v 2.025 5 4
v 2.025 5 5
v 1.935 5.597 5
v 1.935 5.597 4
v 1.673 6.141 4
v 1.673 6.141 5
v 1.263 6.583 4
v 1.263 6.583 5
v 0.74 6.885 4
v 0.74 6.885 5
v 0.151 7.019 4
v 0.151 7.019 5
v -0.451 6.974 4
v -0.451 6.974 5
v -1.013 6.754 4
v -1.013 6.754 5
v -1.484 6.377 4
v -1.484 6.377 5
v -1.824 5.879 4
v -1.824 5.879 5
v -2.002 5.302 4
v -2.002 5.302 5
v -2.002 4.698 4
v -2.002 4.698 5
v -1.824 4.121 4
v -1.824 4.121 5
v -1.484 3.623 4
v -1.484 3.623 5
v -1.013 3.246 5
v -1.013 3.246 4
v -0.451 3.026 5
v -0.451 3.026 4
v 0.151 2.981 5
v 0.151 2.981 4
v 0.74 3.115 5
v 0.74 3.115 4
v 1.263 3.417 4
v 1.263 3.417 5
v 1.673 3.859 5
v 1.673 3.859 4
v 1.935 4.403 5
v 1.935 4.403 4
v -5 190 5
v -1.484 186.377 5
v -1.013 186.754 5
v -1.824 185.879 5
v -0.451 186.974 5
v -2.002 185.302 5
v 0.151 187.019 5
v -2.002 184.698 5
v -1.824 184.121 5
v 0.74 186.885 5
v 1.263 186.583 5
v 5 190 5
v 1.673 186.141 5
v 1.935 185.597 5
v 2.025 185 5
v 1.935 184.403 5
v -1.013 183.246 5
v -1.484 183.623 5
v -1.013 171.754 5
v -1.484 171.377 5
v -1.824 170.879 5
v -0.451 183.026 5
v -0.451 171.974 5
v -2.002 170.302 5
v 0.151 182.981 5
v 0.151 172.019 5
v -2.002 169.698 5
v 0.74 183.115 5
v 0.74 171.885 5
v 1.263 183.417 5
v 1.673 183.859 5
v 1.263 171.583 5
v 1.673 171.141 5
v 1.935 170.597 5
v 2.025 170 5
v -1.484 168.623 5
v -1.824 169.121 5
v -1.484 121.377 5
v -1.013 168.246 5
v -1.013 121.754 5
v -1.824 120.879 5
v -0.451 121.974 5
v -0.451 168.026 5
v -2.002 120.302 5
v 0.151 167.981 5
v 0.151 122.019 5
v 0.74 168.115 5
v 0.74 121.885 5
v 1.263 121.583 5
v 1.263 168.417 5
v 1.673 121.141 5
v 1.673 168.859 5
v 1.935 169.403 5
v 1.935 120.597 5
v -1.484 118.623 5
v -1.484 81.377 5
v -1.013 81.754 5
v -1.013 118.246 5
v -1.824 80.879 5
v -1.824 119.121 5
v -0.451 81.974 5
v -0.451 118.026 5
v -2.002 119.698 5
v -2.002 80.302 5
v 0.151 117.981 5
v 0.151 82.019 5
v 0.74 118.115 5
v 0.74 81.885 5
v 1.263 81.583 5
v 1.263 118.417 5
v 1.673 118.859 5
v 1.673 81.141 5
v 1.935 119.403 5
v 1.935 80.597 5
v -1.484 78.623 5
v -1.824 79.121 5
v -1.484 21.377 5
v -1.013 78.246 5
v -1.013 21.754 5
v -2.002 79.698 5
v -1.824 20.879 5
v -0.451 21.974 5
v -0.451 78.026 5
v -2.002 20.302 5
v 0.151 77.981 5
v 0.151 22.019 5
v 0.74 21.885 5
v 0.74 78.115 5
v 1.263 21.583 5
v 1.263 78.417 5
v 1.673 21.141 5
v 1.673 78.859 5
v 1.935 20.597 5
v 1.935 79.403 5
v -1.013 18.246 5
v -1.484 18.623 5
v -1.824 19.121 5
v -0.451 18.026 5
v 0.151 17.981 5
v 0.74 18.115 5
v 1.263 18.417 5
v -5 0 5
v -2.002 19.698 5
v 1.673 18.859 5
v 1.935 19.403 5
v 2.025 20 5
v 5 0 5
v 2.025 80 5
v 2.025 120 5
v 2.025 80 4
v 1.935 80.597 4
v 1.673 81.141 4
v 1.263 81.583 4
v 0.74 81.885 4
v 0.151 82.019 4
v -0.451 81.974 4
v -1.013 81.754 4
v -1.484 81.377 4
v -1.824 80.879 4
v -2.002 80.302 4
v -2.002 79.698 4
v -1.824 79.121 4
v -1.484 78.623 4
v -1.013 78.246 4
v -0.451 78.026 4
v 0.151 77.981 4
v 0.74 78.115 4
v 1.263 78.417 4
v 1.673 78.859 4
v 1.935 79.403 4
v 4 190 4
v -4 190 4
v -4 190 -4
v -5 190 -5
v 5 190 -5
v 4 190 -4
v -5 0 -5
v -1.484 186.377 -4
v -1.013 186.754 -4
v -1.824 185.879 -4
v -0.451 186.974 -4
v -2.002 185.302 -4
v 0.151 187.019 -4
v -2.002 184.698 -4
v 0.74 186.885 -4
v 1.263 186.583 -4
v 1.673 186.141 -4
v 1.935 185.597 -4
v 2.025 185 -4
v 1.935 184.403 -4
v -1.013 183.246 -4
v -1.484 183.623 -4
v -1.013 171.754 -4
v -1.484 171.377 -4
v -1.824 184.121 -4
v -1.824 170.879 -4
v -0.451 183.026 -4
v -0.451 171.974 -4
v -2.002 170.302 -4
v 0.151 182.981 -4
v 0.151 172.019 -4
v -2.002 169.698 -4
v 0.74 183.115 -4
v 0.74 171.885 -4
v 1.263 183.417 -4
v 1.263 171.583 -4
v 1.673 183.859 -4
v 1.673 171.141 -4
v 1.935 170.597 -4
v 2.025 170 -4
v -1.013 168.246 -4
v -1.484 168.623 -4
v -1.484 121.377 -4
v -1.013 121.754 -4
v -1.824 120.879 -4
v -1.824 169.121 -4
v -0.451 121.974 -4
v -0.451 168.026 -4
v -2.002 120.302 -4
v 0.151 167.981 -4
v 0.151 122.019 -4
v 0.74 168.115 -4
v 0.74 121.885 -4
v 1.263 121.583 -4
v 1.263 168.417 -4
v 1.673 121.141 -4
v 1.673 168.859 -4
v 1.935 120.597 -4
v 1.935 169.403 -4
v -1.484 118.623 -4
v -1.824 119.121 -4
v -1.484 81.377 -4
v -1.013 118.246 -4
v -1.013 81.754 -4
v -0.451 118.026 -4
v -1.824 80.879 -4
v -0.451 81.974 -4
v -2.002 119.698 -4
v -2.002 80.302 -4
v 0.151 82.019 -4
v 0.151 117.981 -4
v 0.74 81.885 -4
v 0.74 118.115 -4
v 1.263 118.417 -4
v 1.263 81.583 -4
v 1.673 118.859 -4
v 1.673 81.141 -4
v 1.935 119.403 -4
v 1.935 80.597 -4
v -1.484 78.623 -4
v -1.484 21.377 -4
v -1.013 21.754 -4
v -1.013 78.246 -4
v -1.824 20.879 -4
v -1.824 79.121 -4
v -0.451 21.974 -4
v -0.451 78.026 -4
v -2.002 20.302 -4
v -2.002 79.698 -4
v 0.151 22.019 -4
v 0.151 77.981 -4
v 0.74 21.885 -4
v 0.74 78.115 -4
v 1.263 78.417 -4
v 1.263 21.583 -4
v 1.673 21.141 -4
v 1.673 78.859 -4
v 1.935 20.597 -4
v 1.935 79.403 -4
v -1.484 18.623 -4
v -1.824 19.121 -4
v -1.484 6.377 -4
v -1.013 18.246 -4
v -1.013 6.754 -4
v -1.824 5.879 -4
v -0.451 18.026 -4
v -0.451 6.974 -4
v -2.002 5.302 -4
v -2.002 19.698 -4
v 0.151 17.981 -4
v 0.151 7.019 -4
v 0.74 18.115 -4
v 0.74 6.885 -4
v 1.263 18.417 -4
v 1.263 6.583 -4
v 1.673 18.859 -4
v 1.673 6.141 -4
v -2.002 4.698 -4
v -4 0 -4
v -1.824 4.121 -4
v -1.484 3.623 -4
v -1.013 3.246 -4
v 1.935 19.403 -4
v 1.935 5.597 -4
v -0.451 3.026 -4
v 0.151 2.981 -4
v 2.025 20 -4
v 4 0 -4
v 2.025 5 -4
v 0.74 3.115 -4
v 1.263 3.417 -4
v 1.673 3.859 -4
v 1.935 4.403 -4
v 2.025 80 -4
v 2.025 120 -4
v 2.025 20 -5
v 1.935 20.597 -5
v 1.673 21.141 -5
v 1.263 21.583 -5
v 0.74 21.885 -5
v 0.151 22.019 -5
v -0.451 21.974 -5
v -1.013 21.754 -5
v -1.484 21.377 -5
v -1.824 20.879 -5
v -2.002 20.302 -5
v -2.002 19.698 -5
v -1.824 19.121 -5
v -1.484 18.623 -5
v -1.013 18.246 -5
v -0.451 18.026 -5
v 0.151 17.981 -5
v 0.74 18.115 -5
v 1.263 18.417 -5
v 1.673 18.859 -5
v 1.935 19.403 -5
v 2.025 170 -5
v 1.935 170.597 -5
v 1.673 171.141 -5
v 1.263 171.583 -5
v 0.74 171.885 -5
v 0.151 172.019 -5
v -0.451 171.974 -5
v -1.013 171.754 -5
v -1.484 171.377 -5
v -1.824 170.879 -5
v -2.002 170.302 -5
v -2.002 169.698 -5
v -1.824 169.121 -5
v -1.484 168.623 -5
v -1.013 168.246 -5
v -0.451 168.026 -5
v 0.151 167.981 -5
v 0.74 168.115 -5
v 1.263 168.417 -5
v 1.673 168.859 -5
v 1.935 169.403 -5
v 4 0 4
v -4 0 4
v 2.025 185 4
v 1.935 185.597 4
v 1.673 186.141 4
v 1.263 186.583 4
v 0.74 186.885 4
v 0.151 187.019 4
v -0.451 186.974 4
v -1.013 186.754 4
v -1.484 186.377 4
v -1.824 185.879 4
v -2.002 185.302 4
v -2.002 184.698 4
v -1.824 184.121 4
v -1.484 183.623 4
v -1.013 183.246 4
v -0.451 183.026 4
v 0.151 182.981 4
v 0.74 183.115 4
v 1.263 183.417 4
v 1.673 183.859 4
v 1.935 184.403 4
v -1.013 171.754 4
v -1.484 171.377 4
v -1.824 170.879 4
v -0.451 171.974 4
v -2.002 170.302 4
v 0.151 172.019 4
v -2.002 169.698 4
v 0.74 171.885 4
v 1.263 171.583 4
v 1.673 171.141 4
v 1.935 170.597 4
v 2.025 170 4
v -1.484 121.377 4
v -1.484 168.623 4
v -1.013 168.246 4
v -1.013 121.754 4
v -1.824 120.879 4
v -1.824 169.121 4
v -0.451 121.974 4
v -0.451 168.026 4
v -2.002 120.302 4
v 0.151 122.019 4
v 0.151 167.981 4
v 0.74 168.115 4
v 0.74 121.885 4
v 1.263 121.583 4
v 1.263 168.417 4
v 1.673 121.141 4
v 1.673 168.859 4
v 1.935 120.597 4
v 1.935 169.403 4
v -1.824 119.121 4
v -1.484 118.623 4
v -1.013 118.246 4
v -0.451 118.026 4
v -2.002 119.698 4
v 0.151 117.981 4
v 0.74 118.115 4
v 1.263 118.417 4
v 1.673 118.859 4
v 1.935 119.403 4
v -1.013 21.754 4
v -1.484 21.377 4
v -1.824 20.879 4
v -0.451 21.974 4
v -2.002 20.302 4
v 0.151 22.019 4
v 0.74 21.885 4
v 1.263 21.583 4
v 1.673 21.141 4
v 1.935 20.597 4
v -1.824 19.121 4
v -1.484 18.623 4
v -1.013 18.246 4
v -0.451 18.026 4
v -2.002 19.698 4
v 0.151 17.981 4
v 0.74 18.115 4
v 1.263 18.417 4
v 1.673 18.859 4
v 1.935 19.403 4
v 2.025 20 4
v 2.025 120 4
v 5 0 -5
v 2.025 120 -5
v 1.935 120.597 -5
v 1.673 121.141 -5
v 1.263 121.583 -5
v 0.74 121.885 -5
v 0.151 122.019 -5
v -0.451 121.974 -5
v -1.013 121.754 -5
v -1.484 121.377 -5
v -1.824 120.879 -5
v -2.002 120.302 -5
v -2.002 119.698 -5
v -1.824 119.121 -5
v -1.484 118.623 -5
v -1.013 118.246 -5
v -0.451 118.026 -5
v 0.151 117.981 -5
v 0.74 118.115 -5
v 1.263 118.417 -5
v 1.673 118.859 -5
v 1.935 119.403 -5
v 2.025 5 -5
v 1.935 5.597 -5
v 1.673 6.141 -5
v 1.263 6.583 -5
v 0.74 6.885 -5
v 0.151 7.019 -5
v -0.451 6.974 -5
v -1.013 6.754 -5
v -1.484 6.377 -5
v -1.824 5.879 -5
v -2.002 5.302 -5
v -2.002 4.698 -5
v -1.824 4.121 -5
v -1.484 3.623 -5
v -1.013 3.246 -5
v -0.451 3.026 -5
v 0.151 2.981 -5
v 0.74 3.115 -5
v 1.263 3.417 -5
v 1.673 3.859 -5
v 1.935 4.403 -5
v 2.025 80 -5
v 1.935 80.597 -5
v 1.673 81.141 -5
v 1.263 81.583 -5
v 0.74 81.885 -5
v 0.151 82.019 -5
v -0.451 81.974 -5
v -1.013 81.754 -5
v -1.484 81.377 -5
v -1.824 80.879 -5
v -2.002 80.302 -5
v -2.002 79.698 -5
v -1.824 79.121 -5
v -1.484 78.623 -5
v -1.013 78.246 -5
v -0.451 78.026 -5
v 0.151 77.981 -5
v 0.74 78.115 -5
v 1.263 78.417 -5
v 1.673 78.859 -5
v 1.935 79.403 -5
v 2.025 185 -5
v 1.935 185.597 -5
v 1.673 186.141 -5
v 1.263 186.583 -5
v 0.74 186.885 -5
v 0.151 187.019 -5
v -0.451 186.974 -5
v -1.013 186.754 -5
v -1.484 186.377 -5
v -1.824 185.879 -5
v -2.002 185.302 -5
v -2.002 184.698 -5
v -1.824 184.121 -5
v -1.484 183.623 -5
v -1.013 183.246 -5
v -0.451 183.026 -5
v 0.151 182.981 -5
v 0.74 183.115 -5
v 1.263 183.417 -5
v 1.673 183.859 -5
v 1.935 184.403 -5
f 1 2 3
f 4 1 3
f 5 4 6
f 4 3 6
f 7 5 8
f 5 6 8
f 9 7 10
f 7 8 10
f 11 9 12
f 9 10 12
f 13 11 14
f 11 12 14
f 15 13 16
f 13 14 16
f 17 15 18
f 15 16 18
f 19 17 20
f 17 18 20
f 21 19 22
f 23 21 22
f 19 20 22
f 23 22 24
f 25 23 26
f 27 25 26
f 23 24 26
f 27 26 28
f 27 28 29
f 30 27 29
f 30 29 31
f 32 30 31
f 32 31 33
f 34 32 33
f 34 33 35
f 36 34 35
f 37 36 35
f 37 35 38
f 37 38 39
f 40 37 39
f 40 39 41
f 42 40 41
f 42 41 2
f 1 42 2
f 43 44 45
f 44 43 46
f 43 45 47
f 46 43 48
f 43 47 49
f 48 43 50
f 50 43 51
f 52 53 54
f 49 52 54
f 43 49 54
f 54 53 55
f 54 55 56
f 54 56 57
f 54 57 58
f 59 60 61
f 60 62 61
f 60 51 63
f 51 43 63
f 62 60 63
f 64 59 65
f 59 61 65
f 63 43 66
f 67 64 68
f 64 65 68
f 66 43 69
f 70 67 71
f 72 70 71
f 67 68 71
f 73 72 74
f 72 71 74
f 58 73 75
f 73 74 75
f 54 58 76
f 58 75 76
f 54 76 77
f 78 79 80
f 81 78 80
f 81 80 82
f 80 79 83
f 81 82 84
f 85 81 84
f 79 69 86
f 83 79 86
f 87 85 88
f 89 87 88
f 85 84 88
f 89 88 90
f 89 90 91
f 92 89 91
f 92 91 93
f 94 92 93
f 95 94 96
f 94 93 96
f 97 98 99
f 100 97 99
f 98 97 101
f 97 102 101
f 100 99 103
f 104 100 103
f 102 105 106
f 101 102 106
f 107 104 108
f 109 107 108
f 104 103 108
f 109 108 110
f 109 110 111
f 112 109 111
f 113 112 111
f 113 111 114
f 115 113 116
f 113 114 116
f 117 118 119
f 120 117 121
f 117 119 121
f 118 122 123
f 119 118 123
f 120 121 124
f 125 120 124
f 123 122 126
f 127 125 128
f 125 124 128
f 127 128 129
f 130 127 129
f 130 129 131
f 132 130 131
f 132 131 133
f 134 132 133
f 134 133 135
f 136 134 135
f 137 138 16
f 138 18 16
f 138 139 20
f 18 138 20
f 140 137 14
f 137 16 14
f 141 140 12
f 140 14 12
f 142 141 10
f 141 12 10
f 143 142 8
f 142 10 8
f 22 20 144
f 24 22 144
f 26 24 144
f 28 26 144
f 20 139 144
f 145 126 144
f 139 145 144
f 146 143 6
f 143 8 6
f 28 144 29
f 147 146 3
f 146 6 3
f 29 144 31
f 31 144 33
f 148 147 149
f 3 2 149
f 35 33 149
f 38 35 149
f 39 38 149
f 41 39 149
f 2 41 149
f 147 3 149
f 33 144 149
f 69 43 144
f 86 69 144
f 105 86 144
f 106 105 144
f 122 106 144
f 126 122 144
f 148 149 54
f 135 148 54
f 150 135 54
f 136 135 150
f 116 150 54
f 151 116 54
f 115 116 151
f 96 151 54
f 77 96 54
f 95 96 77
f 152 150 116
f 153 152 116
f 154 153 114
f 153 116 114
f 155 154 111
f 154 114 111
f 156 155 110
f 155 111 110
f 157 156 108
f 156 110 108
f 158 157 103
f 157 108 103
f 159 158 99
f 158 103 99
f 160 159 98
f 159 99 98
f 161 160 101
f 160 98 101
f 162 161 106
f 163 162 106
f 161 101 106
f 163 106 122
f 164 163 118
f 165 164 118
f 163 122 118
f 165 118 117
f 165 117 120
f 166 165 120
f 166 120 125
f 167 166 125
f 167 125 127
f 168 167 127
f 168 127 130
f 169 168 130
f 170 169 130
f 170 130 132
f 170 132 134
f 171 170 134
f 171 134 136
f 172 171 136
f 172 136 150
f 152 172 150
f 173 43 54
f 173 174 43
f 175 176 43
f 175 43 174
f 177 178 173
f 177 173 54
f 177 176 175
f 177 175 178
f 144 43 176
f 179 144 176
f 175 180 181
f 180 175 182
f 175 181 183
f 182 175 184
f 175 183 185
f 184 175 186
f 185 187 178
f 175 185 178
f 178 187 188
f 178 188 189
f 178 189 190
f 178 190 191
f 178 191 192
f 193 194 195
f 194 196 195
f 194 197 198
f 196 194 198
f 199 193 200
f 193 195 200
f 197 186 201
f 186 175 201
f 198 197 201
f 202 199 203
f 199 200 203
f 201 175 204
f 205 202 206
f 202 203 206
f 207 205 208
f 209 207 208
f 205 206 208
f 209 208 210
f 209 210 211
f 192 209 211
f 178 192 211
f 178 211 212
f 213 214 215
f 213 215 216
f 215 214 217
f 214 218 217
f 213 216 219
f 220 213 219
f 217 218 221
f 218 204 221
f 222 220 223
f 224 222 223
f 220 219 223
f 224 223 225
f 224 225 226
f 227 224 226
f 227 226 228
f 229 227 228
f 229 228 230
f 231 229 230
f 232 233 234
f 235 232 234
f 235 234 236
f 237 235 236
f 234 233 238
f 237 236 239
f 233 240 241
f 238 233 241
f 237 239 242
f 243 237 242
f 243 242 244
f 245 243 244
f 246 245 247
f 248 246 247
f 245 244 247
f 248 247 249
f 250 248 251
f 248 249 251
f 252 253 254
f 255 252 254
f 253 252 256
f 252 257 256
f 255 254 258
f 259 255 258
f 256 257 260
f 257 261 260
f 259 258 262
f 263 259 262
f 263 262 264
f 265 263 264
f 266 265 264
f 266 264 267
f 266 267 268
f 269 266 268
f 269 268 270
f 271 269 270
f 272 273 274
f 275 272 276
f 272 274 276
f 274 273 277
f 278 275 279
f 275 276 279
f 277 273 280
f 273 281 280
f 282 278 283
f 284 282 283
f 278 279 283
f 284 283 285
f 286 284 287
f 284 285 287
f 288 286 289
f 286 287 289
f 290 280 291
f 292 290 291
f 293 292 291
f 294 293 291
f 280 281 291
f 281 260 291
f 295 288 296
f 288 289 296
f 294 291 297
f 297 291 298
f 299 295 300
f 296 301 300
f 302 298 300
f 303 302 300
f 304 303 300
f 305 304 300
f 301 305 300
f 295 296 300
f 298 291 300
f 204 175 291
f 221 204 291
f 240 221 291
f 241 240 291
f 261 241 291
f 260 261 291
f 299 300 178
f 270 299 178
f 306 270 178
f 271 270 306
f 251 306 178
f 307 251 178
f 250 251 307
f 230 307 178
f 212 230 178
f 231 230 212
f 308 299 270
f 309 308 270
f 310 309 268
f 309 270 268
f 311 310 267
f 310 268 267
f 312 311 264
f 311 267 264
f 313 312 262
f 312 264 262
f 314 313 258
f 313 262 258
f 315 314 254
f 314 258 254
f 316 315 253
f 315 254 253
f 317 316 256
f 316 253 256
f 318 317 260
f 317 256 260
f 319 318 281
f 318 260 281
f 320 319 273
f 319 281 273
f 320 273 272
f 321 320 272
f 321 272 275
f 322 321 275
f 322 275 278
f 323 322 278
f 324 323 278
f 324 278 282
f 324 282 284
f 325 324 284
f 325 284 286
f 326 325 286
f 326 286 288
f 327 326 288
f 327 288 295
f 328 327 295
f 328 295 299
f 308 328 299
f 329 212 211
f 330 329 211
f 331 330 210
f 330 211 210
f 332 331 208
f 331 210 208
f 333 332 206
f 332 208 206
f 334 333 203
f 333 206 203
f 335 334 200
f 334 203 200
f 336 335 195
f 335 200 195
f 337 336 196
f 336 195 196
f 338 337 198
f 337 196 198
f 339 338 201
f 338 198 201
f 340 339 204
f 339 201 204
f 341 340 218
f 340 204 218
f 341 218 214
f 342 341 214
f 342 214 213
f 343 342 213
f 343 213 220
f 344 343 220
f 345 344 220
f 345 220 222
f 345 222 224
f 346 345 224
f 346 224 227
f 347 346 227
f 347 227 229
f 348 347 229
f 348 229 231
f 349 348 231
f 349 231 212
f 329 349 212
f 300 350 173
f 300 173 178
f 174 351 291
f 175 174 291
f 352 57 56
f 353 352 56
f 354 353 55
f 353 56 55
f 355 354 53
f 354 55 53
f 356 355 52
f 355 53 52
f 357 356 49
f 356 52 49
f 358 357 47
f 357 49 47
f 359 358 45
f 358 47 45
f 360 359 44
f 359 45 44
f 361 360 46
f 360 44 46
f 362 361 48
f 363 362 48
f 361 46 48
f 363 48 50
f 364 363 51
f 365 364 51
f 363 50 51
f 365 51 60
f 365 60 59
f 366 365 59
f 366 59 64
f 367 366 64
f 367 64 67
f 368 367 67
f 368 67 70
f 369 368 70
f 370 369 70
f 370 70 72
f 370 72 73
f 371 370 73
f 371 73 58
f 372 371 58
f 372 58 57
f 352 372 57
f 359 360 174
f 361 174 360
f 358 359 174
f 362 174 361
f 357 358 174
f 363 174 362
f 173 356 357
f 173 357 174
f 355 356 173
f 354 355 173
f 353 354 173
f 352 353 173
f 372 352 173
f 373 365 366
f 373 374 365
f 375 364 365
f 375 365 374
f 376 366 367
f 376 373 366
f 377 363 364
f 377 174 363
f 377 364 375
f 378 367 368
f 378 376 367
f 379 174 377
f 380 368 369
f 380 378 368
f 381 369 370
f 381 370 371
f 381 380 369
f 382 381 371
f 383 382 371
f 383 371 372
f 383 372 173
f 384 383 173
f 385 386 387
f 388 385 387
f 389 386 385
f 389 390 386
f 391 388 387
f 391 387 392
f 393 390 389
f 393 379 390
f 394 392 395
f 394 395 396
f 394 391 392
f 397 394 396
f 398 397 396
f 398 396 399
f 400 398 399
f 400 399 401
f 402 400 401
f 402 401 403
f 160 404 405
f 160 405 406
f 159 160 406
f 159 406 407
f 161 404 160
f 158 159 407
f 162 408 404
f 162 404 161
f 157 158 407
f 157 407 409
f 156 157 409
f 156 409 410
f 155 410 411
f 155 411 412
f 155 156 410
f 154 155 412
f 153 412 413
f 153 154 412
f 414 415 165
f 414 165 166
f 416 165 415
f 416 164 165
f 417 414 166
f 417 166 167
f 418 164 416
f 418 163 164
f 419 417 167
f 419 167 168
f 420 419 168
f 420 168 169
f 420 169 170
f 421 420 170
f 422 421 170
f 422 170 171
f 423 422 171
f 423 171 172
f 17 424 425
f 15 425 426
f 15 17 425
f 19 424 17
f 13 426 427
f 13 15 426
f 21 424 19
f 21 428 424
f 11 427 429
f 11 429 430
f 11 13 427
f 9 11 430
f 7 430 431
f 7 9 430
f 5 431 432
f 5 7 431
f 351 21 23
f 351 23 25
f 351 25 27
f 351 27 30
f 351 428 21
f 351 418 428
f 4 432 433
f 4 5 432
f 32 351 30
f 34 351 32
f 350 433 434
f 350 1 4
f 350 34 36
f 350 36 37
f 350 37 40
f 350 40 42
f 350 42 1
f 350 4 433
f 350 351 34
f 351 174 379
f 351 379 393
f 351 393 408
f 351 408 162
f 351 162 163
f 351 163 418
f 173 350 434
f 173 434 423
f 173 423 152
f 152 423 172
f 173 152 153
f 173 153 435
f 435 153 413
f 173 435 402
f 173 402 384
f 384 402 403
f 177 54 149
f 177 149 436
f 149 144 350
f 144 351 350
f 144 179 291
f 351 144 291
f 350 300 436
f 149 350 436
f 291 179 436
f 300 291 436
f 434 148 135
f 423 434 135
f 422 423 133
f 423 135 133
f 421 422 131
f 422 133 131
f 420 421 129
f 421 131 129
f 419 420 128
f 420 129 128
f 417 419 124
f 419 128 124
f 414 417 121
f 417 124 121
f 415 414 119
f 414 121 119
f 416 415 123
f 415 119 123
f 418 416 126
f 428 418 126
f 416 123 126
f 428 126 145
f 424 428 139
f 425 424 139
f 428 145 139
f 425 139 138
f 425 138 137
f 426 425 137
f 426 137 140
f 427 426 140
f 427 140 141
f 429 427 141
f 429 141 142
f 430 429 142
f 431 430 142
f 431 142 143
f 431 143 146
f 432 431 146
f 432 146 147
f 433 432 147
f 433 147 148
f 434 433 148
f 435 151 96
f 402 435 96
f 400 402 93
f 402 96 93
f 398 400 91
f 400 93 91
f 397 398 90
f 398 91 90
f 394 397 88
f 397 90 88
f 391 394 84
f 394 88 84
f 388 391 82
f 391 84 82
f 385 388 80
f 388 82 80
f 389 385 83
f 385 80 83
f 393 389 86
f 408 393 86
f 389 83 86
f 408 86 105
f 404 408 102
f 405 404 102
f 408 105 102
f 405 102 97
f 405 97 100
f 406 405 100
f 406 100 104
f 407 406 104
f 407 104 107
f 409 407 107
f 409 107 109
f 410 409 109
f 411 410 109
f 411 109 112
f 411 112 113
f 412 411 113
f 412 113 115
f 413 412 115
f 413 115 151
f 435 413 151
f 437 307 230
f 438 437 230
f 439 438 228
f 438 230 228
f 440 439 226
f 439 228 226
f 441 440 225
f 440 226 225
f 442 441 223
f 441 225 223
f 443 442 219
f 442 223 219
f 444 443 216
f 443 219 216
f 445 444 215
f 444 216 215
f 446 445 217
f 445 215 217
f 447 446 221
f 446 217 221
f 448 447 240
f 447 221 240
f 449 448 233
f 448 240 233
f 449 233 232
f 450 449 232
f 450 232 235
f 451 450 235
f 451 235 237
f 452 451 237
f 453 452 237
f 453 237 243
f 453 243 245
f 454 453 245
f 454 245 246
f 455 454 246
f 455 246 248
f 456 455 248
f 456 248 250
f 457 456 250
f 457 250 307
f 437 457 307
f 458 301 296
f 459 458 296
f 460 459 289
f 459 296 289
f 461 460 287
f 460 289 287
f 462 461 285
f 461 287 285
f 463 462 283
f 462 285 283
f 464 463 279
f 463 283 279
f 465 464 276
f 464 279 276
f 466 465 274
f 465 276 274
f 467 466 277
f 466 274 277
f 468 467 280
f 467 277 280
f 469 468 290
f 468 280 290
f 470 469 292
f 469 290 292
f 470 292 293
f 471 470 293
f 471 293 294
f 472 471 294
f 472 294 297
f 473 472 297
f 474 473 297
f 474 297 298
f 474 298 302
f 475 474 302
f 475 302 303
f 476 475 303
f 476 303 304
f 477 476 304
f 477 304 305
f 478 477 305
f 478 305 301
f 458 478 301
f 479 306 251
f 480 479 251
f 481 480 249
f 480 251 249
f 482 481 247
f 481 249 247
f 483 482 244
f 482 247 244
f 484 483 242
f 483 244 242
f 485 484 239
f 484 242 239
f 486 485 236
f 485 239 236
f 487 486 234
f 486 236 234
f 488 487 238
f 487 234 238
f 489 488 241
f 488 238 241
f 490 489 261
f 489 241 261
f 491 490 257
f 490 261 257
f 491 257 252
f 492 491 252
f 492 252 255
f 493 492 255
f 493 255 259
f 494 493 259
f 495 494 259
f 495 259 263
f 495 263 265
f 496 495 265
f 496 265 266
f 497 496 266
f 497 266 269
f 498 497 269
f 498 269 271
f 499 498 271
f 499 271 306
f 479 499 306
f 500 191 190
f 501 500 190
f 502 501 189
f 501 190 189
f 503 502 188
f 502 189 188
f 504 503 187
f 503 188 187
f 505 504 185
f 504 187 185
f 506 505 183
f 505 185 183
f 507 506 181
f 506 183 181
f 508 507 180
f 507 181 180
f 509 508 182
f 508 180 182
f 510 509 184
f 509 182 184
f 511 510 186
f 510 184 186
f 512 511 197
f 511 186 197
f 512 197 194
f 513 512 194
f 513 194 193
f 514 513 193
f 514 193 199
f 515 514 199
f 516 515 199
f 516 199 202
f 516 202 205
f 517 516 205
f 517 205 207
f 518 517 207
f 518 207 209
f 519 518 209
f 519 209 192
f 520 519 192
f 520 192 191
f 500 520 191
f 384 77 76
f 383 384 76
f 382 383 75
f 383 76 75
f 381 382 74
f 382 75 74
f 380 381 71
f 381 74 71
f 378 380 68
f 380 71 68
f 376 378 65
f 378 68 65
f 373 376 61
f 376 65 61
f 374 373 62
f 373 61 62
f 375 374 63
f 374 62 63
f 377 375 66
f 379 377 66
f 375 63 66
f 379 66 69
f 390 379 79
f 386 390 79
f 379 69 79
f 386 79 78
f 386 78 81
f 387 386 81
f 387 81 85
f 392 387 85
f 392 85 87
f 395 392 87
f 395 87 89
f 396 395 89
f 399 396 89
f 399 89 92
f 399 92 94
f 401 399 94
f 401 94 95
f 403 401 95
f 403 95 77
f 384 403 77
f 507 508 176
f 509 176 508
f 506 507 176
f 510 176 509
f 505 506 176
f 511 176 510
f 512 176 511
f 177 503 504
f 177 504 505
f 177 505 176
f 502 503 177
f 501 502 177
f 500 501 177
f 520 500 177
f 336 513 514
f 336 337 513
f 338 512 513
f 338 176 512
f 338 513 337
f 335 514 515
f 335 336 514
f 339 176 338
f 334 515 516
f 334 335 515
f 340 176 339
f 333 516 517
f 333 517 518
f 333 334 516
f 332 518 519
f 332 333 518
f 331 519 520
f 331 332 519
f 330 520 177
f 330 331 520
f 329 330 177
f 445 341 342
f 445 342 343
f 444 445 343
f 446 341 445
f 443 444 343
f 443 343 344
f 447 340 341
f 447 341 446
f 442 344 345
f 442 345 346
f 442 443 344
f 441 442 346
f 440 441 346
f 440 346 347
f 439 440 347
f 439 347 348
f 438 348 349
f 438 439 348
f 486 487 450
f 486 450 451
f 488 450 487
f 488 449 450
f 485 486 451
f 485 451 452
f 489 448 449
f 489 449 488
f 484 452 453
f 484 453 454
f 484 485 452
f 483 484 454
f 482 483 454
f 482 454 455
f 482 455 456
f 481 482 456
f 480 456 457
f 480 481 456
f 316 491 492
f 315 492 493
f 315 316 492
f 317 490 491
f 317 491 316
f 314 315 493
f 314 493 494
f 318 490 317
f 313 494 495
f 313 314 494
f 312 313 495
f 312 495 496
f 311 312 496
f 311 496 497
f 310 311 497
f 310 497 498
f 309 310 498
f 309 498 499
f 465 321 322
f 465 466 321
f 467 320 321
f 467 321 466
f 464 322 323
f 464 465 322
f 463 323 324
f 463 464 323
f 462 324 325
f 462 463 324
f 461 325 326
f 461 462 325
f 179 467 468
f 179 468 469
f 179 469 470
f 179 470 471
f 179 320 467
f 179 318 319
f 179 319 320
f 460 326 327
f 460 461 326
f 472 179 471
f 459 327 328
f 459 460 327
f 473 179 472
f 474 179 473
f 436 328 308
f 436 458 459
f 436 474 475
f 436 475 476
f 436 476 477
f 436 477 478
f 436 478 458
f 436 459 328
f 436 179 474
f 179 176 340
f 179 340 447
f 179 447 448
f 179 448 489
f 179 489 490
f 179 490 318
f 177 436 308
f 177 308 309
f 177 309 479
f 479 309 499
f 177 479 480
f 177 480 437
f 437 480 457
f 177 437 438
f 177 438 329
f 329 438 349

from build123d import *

# Parameters (mm, degrees)
SKETCH1_W           = 10
SKETCH1_H           = 10
SKETCH1_W_2         = 8
SKETCH1_H_2         = 8
BOSS_EXTRUDE1_DEPTH = 190
SKETCH2_R           = 2.025
CUT_EXTRUDE1_DEPTH  = 191.328663107
SKETCH3_R           = 2.025
CUT_EXTRUDE2_DEPTH  = 191.328663107


with BuildPart() as part:
    # Sketch1 → Boss-Extrude1 (new body)
    with BuildSketch(Plane(origin=(0, 0, 0), x_dir=(1, 0, 0), z_dir=(0, 1, 0))):
        Rectangle(SKETCH1_W, SKETCH1_H)
        Rectangle(SKETCH1_W_2, SKETCH1_H_2, mode=Mode.SUBTRACT)
    extrude(amount=BOSS_EXTRUDE1_DEPTH)

    # Sketch2 → Cut-Extrude1 (cut, through all)
    with BuildSketch(Plane.XY.offset(5)):
        with Locations((0, 120)):
            Circle(SKETCH2_R)
        with Locations((0, 80)):
            Circle(SKETCH2_R)
    extrude(amount=-CUT_EXTRUDE1_DEPTH, mode=Mode.SUBTRACT)

    # Sketch3 → Cut-Extrude2 (cut, through all)
    with BuildSketch(Plane.XY.offset(5)):
        with Locations((0, 185)):
            Circle(SKETCH3_R)
        with Locations((0, 170)):
            Circle(SKETCH3_R)
        with Locations((0, 5)):
            Circle(SKETCH3_R)
        with Locations((0, 20)):
            Circle(SKETCH3_R)
    extrude(amount=-CUT_EXTRUDE2_DEPTH, mode=Mode.SUBTRACT)


solid = part.part
